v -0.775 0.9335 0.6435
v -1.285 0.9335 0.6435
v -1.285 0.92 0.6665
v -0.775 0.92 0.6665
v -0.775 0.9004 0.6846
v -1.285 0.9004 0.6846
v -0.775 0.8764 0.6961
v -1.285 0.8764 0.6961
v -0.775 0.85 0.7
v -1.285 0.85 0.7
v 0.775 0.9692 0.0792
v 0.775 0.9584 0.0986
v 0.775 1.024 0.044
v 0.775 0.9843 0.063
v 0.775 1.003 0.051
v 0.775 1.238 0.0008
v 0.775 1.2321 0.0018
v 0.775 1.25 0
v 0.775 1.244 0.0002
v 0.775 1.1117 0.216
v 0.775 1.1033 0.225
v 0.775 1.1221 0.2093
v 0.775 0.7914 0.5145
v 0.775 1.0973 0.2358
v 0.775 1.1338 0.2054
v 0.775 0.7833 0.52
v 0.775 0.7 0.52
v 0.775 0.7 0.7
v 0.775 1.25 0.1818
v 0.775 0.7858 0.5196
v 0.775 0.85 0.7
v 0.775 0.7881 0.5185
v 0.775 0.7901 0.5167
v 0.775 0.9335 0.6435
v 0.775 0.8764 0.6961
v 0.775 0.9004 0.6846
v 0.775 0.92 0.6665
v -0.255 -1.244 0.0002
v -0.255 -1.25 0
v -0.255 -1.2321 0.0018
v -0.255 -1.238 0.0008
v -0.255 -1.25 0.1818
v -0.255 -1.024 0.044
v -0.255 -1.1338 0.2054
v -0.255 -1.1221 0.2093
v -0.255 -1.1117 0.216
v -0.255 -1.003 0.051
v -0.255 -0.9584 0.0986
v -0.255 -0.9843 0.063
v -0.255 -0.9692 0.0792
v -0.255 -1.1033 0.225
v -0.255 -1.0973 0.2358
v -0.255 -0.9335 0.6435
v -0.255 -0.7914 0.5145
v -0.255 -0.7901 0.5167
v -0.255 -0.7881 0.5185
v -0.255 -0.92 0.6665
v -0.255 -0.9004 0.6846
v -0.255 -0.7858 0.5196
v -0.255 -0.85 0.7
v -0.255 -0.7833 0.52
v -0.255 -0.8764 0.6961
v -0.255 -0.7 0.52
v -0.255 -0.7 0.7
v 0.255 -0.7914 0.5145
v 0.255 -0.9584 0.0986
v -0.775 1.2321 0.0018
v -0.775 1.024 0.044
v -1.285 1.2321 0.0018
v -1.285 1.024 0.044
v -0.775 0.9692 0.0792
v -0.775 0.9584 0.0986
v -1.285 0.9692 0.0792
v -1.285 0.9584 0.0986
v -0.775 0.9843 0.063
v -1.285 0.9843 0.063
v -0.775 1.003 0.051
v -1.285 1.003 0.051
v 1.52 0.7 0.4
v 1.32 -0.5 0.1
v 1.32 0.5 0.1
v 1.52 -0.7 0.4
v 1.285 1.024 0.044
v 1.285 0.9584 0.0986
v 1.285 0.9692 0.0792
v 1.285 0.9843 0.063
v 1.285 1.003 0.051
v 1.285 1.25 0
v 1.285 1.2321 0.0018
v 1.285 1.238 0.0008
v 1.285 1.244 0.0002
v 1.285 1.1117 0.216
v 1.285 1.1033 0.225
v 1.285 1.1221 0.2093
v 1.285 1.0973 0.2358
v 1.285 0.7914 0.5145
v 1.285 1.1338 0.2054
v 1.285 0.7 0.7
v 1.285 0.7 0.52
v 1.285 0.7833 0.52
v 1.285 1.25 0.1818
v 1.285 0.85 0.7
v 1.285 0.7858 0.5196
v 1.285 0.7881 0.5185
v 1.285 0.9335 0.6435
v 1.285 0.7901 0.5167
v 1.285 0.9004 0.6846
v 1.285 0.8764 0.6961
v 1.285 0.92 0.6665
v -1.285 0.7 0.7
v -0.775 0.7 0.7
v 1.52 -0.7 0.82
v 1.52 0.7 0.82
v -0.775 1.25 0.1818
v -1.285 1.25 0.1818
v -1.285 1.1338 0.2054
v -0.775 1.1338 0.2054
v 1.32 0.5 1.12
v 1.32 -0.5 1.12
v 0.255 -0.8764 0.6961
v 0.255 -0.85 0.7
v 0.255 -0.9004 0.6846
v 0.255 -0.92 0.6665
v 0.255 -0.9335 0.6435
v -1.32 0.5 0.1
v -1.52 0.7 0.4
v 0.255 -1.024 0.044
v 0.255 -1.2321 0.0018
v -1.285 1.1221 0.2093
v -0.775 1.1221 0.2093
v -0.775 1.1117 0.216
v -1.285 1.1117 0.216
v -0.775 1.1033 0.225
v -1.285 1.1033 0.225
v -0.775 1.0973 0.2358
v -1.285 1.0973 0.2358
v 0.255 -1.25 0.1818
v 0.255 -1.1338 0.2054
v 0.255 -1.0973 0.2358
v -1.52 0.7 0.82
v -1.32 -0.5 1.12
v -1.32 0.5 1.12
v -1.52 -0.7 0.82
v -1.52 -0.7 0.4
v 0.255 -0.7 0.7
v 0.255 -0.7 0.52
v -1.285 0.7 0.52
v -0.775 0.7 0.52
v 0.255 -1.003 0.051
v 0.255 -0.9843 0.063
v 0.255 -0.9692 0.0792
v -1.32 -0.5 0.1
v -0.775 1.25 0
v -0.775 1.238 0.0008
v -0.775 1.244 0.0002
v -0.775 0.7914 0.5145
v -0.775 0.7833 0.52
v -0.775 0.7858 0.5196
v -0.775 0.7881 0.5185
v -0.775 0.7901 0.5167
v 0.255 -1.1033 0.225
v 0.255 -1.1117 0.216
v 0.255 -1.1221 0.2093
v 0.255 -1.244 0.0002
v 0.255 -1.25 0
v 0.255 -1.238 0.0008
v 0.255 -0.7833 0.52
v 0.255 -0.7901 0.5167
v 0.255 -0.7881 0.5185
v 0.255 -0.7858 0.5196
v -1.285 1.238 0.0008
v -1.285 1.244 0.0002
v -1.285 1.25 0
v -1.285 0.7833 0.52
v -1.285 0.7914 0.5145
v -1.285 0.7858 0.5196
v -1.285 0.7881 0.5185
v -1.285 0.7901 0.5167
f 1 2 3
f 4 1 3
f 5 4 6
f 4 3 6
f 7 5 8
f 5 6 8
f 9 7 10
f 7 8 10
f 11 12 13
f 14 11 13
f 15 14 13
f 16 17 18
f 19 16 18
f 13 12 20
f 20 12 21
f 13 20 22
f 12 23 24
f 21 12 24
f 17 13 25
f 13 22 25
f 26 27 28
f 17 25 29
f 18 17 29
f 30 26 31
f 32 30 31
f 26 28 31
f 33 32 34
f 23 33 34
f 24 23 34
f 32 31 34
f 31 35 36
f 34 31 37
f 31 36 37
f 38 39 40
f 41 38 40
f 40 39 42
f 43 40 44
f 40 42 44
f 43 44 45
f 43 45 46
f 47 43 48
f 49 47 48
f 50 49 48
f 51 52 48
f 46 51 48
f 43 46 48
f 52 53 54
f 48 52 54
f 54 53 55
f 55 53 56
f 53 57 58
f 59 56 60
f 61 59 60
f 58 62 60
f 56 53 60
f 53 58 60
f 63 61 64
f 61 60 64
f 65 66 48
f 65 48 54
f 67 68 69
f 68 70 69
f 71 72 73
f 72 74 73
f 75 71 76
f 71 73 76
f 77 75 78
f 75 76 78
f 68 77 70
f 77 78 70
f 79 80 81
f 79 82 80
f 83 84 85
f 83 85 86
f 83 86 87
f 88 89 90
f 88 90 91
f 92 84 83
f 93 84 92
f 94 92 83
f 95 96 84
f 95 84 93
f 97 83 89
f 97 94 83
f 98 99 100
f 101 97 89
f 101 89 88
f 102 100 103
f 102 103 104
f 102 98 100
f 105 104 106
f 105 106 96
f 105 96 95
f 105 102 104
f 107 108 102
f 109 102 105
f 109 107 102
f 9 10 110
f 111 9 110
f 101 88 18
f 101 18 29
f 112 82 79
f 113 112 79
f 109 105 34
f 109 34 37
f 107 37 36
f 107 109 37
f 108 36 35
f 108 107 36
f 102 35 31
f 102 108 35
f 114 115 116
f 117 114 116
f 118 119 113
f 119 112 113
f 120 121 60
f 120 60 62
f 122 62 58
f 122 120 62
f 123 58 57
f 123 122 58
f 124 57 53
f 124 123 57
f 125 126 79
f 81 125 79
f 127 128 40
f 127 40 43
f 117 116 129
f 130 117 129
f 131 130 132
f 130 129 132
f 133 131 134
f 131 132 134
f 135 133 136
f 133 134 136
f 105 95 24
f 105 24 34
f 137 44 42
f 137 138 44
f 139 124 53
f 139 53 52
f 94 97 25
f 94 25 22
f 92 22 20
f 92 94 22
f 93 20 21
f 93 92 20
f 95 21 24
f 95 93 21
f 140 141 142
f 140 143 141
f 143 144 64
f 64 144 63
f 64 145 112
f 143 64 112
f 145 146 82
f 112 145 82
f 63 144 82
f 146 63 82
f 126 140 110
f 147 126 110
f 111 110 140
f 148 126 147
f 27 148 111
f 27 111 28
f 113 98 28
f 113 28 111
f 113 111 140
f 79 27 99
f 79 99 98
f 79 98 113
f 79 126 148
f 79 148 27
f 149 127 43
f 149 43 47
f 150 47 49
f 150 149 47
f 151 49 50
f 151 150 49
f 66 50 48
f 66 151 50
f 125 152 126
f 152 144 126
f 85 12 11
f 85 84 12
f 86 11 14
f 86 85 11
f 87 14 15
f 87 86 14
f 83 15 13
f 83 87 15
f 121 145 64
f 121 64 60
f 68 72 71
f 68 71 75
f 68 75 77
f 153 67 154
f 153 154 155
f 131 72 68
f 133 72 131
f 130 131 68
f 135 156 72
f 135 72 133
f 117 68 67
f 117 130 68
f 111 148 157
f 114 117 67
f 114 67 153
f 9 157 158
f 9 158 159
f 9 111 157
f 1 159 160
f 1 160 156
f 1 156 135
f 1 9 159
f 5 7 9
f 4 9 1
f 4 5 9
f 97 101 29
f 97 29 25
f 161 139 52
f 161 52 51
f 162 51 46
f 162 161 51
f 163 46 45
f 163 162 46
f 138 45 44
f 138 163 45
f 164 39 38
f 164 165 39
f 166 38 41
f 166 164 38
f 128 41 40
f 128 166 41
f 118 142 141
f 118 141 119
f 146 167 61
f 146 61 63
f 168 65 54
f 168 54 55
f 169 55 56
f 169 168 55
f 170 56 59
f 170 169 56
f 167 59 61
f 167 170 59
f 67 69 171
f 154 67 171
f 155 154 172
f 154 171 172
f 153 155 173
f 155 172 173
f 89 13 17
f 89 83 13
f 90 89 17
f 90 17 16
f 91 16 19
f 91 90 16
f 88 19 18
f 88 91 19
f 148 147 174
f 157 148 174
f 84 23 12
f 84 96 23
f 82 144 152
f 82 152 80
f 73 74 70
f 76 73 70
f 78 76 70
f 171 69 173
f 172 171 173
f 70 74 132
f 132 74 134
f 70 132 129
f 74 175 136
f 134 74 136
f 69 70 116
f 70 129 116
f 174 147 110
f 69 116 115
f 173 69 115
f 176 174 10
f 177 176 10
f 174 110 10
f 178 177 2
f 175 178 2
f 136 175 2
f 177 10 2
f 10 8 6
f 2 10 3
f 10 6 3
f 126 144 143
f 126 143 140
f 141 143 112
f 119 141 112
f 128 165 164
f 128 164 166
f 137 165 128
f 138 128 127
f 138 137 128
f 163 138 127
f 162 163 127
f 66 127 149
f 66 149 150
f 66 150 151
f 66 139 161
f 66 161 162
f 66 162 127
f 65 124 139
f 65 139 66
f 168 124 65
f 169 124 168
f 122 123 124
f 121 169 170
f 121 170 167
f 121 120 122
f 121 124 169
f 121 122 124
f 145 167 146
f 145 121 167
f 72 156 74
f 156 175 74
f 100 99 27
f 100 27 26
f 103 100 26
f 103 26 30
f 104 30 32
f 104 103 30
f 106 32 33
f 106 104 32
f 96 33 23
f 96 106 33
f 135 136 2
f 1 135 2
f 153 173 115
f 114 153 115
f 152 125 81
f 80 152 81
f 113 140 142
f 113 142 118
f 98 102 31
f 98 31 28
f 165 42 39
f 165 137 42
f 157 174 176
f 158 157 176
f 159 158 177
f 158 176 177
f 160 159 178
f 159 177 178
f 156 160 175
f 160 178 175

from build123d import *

# Parameters (mm, degrees)
F1_W       = 3.04
F1_H       = 1.4
F2_DEPTH   = 1.02
F3_SIZE2   = 0.3
F3_SIZE    = 0.2
F3_2_SIZE2 = 0.3
F3_2_SIZE  = 0.2
F4_SIZE2   = 0.3
F4_SIZE    = 0.2
F4_2_SIZE2 = 0.3
F4_2_SIZE  = 0.2
F10_DEPTH  = 0.255
F13_DEPTH  = 0.255


# Not quite as in the source:
# - a pattern or mirror of a feature is missing from the dataset's text; its kind, count and spacing are read off the source's solid


with BuildPart() as f2:
    # F1 (on offset) → F2 (new body)
    with BuildSketch(Plane.XY.offset(0.1)):
        Rectangle(F1_W, F1_H)
    extrude(amount=F2_DEPTH)

    # F3
    f3_edges = [f2.edges().sort_by_distance(p)[0] for p in [
        (-1.52, 0, 1.12),
        (1.52, 0, 1.12),
    ]]
    f3_side = f2.faces().sort_by_distance((0, 0, 1.12))[0]
    chamfer(f3_edges, length=F3_SIZE, length2=F3_SIZE2, reference=f3_side)

    # F3#2
    f3_2_edges = [f2.edges().sort_by_distance(p)[0] for p in [
        (-1.52, 0, 0.1),
        (1.52, 0, 0.1),
    ]]
    f3_2_side = f2.faces().sort_by_distance((0, 0, 0.1))[0]
    chamfer(f3_2_edges, length=F3_2_SIZE, length2=F3_2_SIZE2, reference=f3_2_side)

    # F4
    f4_edges = [f2.edges().sort_by_distance(p)[0] for p in [
        (0, -0.7, 1.12),
        (0, 0.7, 1.12),
    ]]
    f4_side = f2.faces().sort_by_distance((0, 0, 1.12))[0]
    chamfer(f4_edges, length=F4_SIZE, length2=F4_SIZE2, reference=f4_side)

    # F4#2
    f4_2_edges = [f2.edges().sort_by_distance(p)[0] for p in [
        (0, -0.7, 0.1),
        (0, 0.7, 0.1),
    ]]
    f4_2_side = f2.faces().sort_by_distance((0, 0, 0.1))[0]
    chamfer(f4_2_edges, length=F4_2_SIZE, length2=F4_2_SIZE2, reference=f4_2_side)

    # F9 (on 3pt) → F10 (join, symmetric)
    with BuildSketch(Plane.YZ):
        with BuildLine():
            Line((-1.25, 0.09), (-1.25, 0))
            ThreePointArc((-1.25, 0), (-1.241013072, 0.0004498178), (-1.2321159768, 0.001794775))
            Line((-1.2321159768, 0.001794775), (-1.0240477755, 0.043981579))
            ThreePointArc((-1.0240477755, 0.043981579), (-0.9843358775, 0.063029665), (-0.9584175942, 0.0986401552))
            Line((-0.9584175942, 0.0986401552), (-0.7913652221, 0.5145161505))
            ThreePointArc((-0.7913652221, 0.5145161505), (-0.7881487587, 0.5185004288), (-0.7832526987, 0.5199999977))
            Line((-0.7832526987, 0.5199999977), (-0.7000000035, 0.5199999977))
            Line((-0.7000000035, 0.5199999977), (-0.7000000035, 0.7))
            Line((-0.7000000035, 0.7), (-0.85, 0.7))
            ThreePointArc((-0.85, 0.7), (-0.9004023889, 0.6845627199), (-0.9335142045, 0.6435466488))
            Line((-0.9335142045, 0.6435466488), (-1.0973164639, 0.2357617917))
            ThreePointArc((-1.0973164639, 0.2357617917), (-1.1117155102, 0.2159781861), (-1.1337776758, 0.2053959161))
            Line((-1.1337776758, 0.2053959161), (-1.25, 0.1818312946))
            Line((-1.25, 0.1818312946), (-1.25, 0.18))
            Line((-1.25, 0.18), (-1.25, 0.09))
        make_face()
    extrude(amount=F10_DEPTH, both=True)

    # F12 (on offset) → F13 (join, symmetric)
    with BuildSketch(Plane.YZ.offset(1.03)):
        with BuildLine():
            Line((1.0240477755, 0.043981579), (1.2321159768, 0.001794775))
            ThreePointArc((1.2321159768, 0.001794775), (1.241013072, 0.0004498178), (1.25, 0))
            Line((1.25, 0), (1.25, 0.1818312946))
            Line((1.25, 0.1818312946), (1.1337776758, 0.2053959161))
            ThreePointArc((1.1337776758, 0.2053959161), (1.1117155102, 0.2159781861), (1.0973164639, 0.2357617917))
            Line((1.0973164639, 0.2357617917), (0.9335142045, 0.6435466488))
            ThreePointArc((0.9335142045, 0.6435466488), (0.9004023889, 0.6845627199), (0.85, 0.7))
            Line((0.85, 0.7), (0.7000000035, 0.7))
            Line((0.7000000035, 0.7), (0.7000000035, 0.5199999977))
            Line((0.7000000035, 0.5199999977), (0.7832526987, 0.5199999977))
            ThreePointArc((0.7832526987, 0.5199999977), (0.7881487587, 0.5185004288), (0.7913652221, 0.5145161505))
            Line((0.7913652221, 0.5145161505), (0.9584175942, 0.0986401552))
            ThreePointArc((0.9584175942, 0.0986401552), (0.9843358775, 0.063029665), (1.0240477755, 0.043981579))
        make_face()
    f13 = extrude(amount=F13_DEPTH, both=True)

    # F13_copies: F13 across plane
    add(f13.mirror(Plane(origin=(0, 0, 0), x_dir=(0, 0, -1), z_dir=(-1, 0, 0))))


solid = f2.part
